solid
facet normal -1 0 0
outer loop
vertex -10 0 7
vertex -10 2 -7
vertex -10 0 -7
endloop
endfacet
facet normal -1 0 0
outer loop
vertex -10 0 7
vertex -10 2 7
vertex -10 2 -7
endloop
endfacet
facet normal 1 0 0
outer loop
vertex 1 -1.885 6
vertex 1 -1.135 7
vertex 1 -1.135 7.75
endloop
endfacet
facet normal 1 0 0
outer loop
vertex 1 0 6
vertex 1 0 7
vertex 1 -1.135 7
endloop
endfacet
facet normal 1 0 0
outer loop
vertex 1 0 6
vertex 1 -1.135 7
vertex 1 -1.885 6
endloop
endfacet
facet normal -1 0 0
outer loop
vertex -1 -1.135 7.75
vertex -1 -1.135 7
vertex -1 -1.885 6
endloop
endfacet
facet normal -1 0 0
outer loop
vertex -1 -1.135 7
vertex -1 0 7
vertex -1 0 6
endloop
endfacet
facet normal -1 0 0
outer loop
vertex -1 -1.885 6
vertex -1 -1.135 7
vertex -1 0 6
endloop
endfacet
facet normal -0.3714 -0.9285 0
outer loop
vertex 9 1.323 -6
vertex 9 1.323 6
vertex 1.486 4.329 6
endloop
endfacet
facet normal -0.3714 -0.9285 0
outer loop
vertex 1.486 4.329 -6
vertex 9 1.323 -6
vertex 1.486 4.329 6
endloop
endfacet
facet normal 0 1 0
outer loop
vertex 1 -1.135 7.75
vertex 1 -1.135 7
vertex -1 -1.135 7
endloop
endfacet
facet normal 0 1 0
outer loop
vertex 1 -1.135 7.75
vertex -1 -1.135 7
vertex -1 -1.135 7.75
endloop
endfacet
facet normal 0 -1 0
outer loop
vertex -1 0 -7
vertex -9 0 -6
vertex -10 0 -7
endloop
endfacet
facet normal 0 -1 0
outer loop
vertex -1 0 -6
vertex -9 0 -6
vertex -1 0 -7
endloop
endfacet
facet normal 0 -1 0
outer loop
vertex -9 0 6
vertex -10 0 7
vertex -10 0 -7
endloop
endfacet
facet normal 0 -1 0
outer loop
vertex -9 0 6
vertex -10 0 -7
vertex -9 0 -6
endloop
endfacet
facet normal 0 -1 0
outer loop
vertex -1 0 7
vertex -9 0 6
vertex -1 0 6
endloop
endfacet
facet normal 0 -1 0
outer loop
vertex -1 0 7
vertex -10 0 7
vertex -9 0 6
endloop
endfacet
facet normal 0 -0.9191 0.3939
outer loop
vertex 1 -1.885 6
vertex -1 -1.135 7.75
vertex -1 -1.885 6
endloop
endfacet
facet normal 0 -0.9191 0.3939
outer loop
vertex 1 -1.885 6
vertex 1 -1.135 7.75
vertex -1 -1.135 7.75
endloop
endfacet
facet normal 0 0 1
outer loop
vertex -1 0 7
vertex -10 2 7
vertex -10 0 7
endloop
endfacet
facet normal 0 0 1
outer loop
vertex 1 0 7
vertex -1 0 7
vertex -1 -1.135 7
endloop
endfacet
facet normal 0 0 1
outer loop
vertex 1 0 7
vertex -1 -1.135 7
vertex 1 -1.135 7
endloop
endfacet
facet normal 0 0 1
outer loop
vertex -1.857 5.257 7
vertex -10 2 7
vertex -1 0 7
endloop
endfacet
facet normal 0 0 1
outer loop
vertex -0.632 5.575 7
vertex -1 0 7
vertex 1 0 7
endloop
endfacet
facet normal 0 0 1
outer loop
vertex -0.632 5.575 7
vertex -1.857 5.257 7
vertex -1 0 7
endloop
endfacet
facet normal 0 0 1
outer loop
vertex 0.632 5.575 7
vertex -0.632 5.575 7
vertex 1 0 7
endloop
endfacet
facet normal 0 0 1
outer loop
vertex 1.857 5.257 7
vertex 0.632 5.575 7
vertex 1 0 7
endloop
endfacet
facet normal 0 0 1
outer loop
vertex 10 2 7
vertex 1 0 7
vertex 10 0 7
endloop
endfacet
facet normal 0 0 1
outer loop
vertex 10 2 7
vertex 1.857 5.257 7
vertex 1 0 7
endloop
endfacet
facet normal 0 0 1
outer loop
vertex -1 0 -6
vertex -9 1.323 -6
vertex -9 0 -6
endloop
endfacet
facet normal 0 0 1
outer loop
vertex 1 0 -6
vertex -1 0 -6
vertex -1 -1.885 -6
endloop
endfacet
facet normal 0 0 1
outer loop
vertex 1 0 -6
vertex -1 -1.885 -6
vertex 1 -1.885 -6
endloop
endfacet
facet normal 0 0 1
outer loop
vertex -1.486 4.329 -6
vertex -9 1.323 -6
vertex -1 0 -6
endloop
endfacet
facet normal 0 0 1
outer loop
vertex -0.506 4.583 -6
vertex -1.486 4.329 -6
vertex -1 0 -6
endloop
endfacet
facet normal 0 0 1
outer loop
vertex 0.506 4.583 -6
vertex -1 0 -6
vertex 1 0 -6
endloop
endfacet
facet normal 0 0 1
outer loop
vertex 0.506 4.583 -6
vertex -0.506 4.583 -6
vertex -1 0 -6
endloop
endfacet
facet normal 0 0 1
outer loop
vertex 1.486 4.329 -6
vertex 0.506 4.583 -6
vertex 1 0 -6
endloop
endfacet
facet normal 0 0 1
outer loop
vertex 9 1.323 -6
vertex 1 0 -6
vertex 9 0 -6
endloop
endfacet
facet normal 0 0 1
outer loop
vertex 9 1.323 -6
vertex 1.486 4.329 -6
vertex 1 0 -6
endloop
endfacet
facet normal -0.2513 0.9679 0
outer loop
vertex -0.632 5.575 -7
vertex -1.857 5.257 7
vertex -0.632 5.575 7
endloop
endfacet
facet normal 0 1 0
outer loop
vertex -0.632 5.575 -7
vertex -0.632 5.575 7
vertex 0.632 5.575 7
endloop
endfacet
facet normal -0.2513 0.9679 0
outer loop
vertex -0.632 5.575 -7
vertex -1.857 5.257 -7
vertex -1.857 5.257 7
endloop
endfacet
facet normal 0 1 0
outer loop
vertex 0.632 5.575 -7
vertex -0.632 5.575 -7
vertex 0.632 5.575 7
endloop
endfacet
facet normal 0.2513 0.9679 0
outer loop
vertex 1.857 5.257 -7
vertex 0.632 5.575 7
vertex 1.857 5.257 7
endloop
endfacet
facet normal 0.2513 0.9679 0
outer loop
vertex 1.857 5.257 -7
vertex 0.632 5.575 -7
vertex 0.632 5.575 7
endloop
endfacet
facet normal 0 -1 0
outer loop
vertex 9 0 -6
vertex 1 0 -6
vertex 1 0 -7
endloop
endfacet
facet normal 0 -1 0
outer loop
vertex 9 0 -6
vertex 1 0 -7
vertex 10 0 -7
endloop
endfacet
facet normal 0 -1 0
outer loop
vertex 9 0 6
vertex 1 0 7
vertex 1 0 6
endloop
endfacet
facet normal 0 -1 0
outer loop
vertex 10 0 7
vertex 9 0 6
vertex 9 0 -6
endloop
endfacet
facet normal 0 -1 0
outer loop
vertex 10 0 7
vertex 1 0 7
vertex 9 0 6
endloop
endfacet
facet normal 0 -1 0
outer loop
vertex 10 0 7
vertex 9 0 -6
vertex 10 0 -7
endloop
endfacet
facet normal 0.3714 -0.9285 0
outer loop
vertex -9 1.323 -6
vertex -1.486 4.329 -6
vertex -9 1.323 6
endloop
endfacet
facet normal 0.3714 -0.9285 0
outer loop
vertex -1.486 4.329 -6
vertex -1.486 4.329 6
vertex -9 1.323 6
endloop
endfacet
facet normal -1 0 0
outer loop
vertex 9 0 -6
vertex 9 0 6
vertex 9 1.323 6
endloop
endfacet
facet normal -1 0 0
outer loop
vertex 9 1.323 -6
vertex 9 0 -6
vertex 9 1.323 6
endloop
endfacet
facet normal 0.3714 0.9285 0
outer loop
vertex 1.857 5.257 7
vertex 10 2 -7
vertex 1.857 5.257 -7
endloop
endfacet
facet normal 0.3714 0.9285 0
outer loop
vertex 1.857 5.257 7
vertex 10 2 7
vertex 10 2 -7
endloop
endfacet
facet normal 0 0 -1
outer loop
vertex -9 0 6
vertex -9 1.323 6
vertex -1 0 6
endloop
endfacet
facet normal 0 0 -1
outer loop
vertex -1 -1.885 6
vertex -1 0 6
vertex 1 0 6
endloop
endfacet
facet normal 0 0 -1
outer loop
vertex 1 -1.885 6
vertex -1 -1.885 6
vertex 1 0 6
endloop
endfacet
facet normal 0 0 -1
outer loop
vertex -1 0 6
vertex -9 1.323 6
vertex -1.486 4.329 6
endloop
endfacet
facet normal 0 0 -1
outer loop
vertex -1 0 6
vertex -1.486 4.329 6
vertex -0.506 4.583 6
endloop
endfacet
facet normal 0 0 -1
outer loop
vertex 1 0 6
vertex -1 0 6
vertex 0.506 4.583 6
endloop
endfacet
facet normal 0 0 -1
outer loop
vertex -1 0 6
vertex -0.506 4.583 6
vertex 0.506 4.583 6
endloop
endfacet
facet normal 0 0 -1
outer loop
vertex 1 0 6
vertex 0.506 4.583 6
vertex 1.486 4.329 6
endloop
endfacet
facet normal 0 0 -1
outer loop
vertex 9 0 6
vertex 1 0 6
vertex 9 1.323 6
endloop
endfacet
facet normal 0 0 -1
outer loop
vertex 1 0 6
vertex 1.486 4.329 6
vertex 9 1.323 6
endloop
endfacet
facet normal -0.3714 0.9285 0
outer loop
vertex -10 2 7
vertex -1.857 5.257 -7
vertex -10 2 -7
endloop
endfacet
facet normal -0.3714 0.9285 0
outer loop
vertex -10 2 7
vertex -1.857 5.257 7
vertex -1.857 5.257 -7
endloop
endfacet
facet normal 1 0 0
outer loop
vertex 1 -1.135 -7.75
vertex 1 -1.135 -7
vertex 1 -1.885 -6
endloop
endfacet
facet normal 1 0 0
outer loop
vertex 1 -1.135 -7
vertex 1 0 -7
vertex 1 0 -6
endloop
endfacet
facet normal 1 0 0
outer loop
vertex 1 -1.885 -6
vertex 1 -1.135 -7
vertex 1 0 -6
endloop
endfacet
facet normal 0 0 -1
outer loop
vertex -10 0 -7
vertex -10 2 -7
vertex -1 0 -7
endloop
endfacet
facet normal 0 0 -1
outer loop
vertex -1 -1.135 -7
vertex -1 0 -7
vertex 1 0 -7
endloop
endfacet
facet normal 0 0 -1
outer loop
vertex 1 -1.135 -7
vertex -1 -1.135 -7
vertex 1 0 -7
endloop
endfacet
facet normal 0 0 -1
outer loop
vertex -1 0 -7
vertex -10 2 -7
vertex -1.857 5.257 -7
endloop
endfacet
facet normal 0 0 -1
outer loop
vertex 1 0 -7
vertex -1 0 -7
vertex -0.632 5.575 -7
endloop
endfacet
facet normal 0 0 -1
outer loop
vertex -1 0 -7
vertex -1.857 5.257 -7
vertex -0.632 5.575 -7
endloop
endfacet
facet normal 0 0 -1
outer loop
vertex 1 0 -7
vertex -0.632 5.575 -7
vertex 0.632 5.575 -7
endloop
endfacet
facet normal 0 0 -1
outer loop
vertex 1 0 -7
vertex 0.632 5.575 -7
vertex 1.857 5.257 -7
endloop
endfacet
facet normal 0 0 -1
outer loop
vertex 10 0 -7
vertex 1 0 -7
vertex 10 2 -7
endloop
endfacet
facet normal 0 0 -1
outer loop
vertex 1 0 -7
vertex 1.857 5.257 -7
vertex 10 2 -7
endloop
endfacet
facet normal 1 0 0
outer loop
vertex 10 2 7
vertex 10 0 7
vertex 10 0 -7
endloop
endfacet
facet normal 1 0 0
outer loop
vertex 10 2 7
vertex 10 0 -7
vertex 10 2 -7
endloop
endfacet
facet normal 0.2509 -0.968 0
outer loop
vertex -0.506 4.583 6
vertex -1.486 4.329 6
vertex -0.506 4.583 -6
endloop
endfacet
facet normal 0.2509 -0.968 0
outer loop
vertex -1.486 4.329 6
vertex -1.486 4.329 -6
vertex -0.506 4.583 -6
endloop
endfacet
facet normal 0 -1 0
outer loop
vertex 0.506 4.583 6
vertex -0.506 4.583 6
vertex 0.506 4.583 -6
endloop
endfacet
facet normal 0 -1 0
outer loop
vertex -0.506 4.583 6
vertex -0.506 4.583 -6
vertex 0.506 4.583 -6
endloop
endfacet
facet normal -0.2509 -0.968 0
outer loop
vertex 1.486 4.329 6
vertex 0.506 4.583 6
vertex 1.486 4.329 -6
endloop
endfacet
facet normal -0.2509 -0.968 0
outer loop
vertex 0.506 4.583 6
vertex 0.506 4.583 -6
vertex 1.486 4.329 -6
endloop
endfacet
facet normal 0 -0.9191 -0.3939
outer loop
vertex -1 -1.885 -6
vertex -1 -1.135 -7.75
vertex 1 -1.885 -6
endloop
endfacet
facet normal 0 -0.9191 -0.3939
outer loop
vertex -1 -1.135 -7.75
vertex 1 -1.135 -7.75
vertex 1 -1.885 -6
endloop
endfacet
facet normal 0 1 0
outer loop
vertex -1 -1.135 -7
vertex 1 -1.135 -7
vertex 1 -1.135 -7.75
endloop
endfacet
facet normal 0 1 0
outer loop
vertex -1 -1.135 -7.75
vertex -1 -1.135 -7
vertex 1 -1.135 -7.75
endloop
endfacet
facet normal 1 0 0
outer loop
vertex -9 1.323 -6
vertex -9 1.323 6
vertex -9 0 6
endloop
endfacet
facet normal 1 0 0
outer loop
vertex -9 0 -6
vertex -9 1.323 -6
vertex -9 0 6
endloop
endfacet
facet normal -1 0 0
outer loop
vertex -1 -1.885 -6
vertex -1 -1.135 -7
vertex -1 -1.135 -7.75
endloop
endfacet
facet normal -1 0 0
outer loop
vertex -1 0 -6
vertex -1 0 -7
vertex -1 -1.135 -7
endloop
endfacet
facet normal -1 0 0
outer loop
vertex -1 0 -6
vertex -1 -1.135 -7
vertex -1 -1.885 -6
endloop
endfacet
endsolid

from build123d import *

# Parameters (mm, degrees)
EXTRUDE1_DEPTH = 7
FILLET1_R      = 5
SHELL1_T       = -1
EXTRUDE2_DEPTH = 1


with BuildPart() as part:
    # Sketch1 → Extrude1 (new body, symmetric)
    with BuildSketch(Plane.XY):
        Polygon((-10, 0), (10, 0), (10, 2), (0, 6), (-10, 2), align=None)
    extrude(amount=EXTRUDE1_DEPTH, both=True)

    # Fillet1
    fillet1_edges = [part.edges().sort_by_distance(p)[0] for p in [
        (0, 6, 0),
    ]]
    fillet(fillet1_edges, radius=FILLET1_R)

    # Shell1
    shell1_openings = [part.faces().sort_by_distance(p)[0] for p in [
        (0, 0, 0),
    ]]
    offset(amount=SHELL1_T, openings=shell1_openings, kind=Kind.INTERSECTION)

    # Sketch2 → Extrude2 (add, symmetric)
    with BuildSketch(Plane(origin=(0, 0, 0), x_dir=(0, 0, -1), z_dir=(1, 0, 0))):
        Polygon((-6, 0), (-7, 0), (-7, -1.135164807), (-7.75, -1.135164807), (-6, -1.885164807), align=None)
    extrude2 = extrude(amount=EXTRUDE2_DEPTH, both=True)

    # Mirror1: Extrude2 across plane
    add(extrude2.mirror(Plane.XY))


solid = part.part
